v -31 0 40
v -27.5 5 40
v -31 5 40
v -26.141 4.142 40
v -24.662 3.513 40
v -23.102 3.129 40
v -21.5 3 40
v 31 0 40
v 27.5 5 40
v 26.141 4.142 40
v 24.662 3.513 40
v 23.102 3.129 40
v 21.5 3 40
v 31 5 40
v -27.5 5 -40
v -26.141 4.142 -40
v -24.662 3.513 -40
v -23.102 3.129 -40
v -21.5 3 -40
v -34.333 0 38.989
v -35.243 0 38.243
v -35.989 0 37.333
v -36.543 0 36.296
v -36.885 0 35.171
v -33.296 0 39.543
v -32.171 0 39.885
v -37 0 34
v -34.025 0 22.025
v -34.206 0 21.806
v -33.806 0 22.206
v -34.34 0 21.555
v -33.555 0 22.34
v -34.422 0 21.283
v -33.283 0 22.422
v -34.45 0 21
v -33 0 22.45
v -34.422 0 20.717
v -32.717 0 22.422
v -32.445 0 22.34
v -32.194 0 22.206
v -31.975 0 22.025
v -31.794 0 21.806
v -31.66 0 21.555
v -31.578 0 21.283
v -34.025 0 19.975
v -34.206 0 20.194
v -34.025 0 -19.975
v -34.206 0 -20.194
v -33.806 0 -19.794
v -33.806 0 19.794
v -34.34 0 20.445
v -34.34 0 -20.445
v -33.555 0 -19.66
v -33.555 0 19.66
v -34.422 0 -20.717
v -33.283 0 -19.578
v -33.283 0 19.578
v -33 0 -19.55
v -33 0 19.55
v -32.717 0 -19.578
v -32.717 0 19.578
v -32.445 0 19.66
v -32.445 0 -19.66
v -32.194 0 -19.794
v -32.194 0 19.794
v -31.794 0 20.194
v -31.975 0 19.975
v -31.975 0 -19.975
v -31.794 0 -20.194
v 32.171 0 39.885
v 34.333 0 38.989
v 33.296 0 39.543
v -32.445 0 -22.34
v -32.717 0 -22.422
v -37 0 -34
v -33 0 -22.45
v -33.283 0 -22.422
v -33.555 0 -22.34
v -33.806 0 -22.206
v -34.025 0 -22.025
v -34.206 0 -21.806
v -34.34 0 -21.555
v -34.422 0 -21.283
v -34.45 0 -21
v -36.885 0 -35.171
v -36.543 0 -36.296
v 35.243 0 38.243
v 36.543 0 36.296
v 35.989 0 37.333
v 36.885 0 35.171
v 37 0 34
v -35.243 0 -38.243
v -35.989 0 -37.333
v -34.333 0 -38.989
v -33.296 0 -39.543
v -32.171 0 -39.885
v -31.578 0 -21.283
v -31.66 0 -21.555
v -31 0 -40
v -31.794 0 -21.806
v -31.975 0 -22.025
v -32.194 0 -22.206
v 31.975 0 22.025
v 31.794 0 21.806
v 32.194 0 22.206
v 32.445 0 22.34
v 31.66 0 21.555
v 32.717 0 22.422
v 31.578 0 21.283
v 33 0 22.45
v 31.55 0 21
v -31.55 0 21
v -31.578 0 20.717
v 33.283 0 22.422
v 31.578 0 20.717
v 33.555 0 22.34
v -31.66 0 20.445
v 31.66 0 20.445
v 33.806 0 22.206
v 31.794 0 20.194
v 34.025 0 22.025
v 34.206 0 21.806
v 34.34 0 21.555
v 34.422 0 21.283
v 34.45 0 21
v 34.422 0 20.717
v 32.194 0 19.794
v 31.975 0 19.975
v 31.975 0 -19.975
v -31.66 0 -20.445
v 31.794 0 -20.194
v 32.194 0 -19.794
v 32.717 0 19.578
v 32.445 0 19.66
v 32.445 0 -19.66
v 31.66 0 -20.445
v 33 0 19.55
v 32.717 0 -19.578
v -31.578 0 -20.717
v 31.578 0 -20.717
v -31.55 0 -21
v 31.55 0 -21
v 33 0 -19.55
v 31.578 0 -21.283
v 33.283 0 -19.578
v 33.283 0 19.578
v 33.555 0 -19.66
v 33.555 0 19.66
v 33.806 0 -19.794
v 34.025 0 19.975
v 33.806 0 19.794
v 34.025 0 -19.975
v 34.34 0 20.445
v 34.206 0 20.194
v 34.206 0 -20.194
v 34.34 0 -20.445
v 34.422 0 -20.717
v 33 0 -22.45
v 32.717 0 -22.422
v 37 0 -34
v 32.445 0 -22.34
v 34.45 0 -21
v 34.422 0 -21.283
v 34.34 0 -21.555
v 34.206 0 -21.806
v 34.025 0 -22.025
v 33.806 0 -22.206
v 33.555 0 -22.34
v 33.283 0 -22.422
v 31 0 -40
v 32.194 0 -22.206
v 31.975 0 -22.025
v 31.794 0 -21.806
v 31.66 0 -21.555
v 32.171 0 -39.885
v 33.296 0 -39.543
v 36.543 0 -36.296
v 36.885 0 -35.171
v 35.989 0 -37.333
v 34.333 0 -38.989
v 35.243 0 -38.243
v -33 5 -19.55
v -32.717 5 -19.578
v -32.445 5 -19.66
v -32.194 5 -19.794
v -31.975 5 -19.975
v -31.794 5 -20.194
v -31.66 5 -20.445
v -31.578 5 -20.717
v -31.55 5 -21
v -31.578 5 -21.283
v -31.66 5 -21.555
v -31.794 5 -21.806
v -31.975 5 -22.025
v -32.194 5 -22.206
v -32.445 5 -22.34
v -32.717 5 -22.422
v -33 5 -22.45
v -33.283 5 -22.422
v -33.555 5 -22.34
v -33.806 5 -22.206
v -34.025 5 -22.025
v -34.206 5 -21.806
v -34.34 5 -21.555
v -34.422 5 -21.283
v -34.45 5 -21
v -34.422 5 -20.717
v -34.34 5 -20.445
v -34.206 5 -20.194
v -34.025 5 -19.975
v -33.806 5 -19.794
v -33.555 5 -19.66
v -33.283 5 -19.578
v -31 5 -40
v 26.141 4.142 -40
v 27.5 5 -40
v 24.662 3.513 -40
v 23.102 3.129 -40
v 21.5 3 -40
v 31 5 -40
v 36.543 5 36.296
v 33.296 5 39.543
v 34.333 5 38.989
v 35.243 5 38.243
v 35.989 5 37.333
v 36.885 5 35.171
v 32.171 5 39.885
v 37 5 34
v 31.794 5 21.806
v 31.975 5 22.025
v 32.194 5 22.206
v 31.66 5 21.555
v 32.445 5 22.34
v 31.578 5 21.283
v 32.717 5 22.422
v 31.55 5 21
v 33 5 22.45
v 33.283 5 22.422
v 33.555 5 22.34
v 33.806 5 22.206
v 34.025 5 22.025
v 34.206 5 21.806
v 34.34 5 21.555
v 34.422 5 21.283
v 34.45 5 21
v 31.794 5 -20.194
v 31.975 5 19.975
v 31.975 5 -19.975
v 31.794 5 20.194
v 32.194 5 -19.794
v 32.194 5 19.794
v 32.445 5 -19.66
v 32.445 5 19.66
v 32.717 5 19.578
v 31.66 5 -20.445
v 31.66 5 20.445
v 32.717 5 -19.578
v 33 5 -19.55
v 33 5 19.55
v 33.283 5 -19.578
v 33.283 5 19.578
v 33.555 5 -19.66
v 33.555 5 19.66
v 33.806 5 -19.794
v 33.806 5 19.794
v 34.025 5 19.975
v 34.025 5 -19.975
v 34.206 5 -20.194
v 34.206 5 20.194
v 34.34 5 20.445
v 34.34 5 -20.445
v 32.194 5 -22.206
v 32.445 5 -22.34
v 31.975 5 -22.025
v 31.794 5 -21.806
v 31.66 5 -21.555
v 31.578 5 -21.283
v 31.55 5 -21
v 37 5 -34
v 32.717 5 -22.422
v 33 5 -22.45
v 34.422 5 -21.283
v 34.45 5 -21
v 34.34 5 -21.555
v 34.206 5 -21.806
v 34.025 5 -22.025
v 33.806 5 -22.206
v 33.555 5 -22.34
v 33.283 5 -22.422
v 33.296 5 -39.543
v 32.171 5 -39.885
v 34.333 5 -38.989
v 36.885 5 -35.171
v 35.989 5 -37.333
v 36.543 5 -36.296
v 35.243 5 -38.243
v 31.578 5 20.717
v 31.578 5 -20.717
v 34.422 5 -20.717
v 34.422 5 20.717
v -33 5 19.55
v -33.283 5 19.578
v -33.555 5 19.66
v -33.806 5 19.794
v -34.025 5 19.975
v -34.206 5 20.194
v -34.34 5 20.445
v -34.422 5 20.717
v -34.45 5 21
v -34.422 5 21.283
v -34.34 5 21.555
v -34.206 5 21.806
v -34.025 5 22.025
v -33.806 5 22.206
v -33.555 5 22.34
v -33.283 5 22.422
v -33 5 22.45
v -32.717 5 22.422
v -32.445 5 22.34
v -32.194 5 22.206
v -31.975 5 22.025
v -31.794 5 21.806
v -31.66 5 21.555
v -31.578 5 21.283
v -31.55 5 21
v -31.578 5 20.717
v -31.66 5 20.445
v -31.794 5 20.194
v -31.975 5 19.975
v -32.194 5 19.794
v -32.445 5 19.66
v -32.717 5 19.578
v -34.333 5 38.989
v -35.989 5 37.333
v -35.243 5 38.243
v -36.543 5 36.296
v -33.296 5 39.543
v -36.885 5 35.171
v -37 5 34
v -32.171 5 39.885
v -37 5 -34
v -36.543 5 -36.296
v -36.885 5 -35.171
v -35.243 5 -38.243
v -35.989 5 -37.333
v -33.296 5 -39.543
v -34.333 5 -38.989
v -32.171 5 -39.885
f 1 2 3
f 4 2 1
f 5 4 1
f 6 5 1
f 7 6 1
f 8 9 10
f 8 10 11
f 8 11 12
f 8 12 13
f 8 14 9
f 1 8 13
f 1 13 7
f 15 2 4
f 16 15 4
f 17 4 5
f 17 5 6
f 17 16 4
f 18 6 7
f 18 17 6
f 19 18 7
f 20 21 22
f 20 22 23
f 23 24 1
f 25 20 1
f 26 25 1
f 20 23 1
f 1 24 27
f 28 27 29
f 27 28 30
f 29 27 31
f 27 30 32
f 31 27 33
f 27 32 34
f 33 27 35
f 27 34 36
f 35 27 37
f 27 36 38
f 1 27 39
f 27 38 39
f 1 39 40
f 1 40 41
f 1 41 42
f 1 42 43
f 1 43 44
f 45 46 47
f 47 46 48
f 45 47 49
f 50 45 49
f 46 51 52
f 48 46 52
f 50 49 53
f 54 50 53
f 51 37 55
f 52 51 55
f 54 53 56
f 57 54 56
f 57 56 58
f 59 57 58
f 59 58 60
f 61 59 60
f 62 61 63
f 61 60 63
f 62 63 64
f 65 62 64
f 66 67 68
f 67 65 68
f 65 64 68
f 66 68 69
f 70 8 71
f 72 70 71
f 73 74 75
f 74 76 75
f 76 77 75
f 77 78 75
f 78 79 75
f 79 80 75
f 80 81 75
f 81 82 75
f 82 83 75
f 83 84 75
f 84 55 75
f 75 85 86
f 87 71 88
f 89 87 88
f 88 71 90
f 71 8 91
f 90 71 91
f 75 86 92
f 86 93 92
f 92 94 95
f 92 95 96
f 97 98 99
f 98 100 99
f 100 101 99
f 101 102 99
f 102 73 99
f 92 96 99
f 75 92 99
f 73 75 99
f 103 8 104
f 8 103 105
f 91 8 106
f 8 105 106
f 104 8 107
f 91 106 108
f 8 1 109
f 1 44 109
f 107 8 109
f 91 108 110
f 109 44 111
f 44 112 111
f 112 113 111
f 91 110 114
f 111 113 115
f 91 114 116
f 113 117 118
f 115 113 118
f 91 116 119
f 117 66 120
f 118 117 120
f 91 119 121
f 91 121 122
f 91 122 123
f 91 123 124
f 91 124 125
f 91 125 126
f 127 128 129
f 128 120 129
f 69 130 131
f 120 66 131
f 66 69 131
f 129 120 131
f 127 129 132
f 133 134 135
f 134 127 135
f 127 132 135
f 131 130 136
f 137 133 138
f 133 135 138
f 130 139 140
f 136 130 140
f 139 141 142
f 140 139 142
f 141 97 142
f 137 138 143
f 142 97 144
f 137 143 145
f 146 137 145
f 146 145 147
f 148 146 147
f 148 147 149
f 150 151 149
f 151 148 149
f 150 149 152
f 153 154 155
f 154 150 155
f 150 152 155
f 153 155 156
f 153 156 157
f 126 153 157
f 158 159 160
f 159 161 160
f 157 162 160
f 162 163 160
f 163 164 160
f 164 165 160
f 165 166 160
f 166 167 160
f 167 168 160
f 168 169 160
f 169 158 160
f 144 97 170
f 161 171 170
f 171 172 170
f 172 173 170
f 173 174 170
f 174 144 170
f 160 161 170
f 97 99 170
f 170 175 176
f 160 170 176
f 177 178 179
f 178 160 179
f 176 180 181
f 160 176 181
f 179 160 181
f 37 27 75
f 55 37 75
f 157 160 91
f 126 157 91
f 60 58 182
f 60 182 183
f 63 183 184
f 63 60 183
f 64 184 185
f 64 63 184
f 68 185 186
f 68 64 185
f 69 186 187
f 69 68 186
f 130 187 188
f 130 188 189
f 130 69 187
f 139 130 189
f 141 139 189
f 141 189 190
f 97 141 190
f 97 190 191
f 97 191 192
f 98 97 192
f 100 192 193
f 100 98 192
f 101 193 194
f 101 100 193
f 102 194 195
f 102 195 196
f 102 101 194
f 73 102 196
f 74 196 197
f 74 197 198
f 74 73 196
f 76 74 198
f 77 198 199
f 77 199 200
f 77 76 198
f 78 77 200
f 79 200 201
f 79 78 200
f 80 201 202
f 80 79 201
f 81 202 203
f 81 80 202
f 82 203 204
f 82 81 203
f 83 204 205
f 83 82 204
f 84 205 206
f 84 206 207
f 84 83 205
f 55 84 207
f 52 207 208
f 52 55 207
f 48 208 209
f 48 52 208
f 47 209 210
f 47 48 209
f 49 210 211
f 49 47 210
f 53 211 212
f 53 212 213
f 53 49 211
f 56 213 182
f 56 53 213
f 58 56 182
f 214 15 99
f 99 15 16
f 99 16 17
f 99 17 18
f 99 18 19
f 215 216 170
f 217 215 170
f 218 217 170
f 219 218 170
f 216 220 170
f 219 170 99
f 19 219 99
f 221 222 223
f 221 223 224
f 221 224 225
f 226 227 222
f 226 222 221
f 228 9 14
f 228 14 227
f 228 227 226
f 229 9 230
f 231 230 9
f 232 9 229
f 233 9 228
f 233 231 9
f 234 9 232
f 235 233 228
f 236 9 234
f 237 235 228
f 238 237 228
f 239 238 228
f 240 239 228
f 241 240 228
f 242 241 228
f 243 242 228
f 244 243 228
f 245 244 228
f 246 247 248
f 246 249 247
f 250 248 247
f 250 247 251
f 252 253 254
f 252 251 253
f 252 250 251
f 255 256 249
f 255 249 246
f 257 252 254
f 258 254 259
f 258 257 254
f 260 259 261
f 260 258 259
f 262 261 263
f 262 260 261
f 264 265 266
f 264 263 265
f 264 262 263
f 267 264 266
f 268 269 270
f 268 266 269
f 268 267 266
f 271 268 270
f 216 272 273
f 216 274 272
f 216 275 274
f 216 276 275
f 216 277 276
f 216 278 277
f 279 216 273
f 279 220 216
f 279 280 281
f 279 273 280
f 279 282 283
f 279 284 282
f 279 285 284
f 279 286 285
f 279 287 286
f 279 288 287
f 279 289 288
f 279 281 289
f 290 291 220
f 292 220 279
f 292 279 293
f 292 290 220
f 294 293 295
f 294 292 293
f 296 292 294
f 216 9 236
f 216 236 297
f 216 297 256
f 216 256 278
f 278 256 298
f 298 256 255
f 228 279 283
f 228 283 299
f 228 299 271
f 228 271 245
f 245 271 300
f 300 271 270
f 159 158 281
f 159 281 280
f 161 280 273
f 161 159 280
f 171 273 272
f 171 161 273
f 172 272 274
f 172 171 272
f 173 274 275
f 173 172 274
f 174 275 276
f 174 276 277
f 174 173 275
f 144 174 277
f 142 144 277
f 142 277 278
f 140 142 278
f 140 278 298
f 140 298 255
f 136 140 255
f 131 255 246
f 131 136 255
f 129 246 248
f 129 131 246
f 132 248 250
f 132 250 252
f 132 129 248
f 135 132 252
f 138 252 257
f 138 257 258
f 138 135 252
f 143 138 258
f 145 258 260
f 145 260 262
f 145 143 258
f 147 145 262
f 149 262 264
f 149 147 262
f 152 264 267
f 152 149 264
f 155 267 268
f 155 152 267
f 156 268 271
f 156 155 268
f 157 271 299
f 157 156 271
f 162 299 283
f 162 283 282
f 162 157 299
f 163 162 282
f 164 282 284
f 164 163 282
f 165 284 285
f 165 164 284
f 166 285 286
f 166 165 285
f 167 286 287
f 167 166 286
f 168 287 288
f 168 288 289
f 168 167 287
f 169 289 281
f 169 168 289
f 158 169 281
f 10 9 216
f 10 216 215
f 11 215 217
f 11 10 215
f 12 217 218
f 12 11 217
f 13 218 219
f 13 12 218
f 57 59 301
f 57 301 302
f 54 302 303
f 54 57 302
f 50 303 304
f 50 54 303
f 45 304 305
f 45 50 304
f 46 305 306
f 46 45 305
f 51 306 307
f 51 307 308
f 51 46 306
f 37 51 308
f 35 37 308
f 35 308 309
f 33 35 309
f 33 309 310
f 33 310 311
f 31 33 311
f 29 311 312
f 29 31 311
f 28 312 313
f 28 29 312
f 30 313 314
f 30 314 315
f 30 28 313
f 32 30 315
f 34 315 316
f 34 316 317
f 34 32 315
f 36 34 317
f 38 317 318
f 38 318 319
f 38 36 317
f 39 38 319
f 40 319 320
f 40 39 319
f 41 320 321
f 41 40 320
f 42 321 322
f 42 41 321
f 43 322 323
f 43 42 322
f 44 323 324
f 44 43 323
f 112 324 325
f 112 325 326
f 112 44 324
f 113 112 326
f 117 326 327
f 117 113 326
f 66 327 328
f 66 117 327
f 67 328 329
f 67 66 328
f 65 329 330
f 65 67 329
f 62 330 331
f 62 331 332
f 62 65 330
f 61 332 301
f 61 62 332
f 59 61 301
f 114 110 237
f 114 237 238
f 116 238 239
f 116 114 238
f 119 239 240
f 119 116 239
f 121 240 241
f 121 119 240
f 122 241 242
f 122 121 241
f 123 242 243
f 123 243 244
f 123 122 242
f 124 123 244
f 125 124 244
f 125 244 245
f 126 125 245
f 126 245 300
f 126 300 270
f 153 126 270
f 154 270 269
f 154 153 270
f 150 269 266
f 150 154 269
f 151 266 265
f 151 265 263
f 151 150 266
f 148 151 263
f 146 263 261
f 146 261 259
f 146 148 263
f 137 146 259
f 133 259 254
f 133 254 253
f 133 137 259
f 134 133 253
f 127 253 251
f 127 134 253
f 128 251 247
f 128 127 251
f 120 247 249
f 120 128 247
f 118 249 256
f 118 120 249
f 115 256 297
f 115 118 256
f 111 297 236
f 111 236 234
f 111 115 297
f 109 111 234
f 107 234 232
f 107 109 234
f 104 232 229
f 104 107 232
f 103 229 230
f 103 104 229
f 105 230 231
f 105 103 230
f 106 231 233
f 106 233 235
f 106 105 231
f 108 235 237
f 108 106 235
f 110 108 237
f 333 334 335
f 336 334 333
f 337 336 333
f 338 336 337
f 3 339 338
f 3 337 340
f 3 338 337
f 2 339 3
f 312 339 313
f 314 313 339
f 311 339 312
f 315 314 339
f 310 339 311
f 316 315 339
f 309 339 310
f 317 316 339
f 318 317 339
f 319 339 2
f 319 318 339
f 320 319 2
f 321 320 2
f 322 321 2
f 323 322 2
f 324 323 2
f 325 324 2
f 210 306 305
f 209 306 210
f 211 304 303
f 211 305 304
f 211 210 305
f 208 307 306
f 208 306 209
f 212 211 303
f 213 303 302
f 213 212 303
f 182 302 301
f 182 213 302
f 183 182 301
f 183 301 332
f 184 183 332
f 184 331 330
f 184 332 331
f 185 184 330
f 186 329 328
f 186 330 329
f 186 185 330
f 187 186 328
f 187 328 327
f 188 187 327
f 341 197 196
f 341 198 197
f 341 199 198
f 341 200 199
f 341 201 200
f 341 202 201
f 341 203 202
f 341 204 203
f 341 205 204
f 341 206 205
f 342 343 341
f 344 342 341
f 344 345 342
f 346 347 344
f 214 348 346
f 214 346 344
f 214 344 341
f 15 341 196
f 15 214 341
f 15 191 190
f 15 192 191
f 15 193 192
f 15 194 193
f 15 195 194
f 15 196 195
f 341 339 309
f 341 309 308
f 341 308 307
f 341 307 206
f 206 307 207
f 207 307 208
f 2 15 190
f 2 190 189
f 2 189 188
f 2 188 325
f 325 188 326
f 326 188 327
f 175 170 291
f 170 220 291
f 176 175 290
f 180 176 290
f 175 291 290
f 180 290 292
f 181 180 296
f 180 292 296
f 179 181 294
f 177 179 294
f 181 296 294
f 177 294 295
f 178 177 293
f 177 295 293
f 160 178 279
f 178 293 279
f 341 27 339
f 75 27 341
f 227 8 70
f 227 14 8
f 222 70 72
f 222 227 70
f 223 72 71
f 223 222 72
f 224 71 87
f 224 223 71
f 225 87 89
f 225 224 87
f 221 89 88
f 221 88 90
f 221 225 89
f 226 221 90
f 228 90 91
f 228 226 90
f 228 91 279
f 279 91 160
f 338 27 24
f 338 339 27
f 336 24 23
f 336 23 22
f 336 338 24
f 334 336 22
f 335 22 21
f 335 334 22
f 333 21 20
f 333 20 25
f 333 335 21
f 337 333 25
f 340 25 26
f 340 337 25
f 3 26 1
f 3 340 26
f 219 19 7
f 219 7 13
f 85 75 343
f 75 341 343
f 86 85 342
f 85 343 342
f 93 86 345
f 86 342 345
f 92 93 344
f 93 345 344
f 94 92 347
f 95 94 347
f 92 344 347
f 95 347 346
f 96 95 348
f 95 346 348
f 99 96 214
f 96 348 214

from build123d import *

# Parameters (mm, degrees)
SKETCH_1_W          = 74
SKETCH_1_H          = 80
SKETCH_1_R          = 1.45
EXTRUDE_1_DEPTH     = 5
FILLET_1_R          = 6
SKETCH_2_W          = 55
SKETCH_2_H          = 80
CUT_EXTRUDE_1_DEPTH = 2
FILLET_2_R          = 10


with BuildPart() as part:
    # 草图1 → 凸台-拉伸1 (new body)
    with BuildSketch(Plane(origin=(0, 0, 0), x_dir=(1, 0, 0), z_dir=(0, 1, 0))):
        Rectangle(SKETCH_1_W, SKETCH_1_H)
        with Locations(Location((-33, 21, 0), (0, 0, 270))):
            Circle(SKETCH_1_R, mode=Mode.SUBTRACT)
        with Locations(Location((-33, -21, 0), (0, 0, 90))):
            Circle(SKETCH_1_R, mode=Mode.SUBTRACT)
        with Locations(Location((33, -21, 0), (0, 0, 270))):
            Circle(SKETCH_1_R, mode=Mode.SUBTRACT)
        with Locations(Location((33, 21, 0), (0, 0, 90))):
            Circle(SKETCH_1_R, mode=Mode.SUBTRACT)
    extrude(amount=EXTRUDE_1_DEPTH)

    # 圆角1
    fillet_1_edges = [part.edges().sort_by_distance(p)[0] for p in [
        (37, 2.5, 40),
        (-37, 2.5, 40),
        (-37, 2.5, -40),
        (37, 2.5, -40),
    ]]
    fillet(fillet_1_edges, radius=FILLET_1_R)

    # 草图2 → 切除-拉伸1 (cut)
    with BuildSketch(Plane(origin=(0, 5, 0), x_dir=(1, 0, 0), z_dir=(0, 1, 0))):
        Rectangle(SKETCH_2_W, SKETCH_2_H)
    extrude(amount=-CUT_EXTRUDE_1_DEPTH, mode=Mode.SUBTRACT)

    # 圆角2
    # the kernel refuses this fillet: 10 mm, written as the material it adds along each edge
    with BuildSketch(Plane(origin=(-27.5, 3, -40), x_dir=(1, 0, 0), z_dir=(0, 0, 1))) as fillet_2_piece_1:
        with BuildLine():
            CenterArc((6, 10), FILLET_2_R, 233.130102354, 36.869897646)
            Line((0, 2), (-0.12, 1.84))
            ThreePointArc((-0.12, 1.84), (-0.2, 1), (-0.2, 0))
            Line((-0.2, 0), (0, -0.2))
            Line((0, -0.2), (6, -0.2))
            Line((6, -0.2), (6, 0))
        make_face()
    extrude(amount=80)
    with BuildSketch(Plane(origin=(27.5, 3, 40), x_dir=(0, 1, 0), z_dir=(0, 0, -1))) as fillet_2_piece_2:
        with BuildLine():
            CenterArc((10, -6), FILLET_2_R, 143.130102354, 36.869897646)
            Line((0, -6), (-0.2, -6))
            Line((-0.2, -6), (-0.2, 0))
            Line((-0.2, 0), (0, 0.2))
            ThreePointArc((0, 0.2), (1, 0.2), (1.84, 0.12))
            Line((1.84, 0.12), (2, 0))
        make_face()
    extrude(amount=80)


solid = part.part
